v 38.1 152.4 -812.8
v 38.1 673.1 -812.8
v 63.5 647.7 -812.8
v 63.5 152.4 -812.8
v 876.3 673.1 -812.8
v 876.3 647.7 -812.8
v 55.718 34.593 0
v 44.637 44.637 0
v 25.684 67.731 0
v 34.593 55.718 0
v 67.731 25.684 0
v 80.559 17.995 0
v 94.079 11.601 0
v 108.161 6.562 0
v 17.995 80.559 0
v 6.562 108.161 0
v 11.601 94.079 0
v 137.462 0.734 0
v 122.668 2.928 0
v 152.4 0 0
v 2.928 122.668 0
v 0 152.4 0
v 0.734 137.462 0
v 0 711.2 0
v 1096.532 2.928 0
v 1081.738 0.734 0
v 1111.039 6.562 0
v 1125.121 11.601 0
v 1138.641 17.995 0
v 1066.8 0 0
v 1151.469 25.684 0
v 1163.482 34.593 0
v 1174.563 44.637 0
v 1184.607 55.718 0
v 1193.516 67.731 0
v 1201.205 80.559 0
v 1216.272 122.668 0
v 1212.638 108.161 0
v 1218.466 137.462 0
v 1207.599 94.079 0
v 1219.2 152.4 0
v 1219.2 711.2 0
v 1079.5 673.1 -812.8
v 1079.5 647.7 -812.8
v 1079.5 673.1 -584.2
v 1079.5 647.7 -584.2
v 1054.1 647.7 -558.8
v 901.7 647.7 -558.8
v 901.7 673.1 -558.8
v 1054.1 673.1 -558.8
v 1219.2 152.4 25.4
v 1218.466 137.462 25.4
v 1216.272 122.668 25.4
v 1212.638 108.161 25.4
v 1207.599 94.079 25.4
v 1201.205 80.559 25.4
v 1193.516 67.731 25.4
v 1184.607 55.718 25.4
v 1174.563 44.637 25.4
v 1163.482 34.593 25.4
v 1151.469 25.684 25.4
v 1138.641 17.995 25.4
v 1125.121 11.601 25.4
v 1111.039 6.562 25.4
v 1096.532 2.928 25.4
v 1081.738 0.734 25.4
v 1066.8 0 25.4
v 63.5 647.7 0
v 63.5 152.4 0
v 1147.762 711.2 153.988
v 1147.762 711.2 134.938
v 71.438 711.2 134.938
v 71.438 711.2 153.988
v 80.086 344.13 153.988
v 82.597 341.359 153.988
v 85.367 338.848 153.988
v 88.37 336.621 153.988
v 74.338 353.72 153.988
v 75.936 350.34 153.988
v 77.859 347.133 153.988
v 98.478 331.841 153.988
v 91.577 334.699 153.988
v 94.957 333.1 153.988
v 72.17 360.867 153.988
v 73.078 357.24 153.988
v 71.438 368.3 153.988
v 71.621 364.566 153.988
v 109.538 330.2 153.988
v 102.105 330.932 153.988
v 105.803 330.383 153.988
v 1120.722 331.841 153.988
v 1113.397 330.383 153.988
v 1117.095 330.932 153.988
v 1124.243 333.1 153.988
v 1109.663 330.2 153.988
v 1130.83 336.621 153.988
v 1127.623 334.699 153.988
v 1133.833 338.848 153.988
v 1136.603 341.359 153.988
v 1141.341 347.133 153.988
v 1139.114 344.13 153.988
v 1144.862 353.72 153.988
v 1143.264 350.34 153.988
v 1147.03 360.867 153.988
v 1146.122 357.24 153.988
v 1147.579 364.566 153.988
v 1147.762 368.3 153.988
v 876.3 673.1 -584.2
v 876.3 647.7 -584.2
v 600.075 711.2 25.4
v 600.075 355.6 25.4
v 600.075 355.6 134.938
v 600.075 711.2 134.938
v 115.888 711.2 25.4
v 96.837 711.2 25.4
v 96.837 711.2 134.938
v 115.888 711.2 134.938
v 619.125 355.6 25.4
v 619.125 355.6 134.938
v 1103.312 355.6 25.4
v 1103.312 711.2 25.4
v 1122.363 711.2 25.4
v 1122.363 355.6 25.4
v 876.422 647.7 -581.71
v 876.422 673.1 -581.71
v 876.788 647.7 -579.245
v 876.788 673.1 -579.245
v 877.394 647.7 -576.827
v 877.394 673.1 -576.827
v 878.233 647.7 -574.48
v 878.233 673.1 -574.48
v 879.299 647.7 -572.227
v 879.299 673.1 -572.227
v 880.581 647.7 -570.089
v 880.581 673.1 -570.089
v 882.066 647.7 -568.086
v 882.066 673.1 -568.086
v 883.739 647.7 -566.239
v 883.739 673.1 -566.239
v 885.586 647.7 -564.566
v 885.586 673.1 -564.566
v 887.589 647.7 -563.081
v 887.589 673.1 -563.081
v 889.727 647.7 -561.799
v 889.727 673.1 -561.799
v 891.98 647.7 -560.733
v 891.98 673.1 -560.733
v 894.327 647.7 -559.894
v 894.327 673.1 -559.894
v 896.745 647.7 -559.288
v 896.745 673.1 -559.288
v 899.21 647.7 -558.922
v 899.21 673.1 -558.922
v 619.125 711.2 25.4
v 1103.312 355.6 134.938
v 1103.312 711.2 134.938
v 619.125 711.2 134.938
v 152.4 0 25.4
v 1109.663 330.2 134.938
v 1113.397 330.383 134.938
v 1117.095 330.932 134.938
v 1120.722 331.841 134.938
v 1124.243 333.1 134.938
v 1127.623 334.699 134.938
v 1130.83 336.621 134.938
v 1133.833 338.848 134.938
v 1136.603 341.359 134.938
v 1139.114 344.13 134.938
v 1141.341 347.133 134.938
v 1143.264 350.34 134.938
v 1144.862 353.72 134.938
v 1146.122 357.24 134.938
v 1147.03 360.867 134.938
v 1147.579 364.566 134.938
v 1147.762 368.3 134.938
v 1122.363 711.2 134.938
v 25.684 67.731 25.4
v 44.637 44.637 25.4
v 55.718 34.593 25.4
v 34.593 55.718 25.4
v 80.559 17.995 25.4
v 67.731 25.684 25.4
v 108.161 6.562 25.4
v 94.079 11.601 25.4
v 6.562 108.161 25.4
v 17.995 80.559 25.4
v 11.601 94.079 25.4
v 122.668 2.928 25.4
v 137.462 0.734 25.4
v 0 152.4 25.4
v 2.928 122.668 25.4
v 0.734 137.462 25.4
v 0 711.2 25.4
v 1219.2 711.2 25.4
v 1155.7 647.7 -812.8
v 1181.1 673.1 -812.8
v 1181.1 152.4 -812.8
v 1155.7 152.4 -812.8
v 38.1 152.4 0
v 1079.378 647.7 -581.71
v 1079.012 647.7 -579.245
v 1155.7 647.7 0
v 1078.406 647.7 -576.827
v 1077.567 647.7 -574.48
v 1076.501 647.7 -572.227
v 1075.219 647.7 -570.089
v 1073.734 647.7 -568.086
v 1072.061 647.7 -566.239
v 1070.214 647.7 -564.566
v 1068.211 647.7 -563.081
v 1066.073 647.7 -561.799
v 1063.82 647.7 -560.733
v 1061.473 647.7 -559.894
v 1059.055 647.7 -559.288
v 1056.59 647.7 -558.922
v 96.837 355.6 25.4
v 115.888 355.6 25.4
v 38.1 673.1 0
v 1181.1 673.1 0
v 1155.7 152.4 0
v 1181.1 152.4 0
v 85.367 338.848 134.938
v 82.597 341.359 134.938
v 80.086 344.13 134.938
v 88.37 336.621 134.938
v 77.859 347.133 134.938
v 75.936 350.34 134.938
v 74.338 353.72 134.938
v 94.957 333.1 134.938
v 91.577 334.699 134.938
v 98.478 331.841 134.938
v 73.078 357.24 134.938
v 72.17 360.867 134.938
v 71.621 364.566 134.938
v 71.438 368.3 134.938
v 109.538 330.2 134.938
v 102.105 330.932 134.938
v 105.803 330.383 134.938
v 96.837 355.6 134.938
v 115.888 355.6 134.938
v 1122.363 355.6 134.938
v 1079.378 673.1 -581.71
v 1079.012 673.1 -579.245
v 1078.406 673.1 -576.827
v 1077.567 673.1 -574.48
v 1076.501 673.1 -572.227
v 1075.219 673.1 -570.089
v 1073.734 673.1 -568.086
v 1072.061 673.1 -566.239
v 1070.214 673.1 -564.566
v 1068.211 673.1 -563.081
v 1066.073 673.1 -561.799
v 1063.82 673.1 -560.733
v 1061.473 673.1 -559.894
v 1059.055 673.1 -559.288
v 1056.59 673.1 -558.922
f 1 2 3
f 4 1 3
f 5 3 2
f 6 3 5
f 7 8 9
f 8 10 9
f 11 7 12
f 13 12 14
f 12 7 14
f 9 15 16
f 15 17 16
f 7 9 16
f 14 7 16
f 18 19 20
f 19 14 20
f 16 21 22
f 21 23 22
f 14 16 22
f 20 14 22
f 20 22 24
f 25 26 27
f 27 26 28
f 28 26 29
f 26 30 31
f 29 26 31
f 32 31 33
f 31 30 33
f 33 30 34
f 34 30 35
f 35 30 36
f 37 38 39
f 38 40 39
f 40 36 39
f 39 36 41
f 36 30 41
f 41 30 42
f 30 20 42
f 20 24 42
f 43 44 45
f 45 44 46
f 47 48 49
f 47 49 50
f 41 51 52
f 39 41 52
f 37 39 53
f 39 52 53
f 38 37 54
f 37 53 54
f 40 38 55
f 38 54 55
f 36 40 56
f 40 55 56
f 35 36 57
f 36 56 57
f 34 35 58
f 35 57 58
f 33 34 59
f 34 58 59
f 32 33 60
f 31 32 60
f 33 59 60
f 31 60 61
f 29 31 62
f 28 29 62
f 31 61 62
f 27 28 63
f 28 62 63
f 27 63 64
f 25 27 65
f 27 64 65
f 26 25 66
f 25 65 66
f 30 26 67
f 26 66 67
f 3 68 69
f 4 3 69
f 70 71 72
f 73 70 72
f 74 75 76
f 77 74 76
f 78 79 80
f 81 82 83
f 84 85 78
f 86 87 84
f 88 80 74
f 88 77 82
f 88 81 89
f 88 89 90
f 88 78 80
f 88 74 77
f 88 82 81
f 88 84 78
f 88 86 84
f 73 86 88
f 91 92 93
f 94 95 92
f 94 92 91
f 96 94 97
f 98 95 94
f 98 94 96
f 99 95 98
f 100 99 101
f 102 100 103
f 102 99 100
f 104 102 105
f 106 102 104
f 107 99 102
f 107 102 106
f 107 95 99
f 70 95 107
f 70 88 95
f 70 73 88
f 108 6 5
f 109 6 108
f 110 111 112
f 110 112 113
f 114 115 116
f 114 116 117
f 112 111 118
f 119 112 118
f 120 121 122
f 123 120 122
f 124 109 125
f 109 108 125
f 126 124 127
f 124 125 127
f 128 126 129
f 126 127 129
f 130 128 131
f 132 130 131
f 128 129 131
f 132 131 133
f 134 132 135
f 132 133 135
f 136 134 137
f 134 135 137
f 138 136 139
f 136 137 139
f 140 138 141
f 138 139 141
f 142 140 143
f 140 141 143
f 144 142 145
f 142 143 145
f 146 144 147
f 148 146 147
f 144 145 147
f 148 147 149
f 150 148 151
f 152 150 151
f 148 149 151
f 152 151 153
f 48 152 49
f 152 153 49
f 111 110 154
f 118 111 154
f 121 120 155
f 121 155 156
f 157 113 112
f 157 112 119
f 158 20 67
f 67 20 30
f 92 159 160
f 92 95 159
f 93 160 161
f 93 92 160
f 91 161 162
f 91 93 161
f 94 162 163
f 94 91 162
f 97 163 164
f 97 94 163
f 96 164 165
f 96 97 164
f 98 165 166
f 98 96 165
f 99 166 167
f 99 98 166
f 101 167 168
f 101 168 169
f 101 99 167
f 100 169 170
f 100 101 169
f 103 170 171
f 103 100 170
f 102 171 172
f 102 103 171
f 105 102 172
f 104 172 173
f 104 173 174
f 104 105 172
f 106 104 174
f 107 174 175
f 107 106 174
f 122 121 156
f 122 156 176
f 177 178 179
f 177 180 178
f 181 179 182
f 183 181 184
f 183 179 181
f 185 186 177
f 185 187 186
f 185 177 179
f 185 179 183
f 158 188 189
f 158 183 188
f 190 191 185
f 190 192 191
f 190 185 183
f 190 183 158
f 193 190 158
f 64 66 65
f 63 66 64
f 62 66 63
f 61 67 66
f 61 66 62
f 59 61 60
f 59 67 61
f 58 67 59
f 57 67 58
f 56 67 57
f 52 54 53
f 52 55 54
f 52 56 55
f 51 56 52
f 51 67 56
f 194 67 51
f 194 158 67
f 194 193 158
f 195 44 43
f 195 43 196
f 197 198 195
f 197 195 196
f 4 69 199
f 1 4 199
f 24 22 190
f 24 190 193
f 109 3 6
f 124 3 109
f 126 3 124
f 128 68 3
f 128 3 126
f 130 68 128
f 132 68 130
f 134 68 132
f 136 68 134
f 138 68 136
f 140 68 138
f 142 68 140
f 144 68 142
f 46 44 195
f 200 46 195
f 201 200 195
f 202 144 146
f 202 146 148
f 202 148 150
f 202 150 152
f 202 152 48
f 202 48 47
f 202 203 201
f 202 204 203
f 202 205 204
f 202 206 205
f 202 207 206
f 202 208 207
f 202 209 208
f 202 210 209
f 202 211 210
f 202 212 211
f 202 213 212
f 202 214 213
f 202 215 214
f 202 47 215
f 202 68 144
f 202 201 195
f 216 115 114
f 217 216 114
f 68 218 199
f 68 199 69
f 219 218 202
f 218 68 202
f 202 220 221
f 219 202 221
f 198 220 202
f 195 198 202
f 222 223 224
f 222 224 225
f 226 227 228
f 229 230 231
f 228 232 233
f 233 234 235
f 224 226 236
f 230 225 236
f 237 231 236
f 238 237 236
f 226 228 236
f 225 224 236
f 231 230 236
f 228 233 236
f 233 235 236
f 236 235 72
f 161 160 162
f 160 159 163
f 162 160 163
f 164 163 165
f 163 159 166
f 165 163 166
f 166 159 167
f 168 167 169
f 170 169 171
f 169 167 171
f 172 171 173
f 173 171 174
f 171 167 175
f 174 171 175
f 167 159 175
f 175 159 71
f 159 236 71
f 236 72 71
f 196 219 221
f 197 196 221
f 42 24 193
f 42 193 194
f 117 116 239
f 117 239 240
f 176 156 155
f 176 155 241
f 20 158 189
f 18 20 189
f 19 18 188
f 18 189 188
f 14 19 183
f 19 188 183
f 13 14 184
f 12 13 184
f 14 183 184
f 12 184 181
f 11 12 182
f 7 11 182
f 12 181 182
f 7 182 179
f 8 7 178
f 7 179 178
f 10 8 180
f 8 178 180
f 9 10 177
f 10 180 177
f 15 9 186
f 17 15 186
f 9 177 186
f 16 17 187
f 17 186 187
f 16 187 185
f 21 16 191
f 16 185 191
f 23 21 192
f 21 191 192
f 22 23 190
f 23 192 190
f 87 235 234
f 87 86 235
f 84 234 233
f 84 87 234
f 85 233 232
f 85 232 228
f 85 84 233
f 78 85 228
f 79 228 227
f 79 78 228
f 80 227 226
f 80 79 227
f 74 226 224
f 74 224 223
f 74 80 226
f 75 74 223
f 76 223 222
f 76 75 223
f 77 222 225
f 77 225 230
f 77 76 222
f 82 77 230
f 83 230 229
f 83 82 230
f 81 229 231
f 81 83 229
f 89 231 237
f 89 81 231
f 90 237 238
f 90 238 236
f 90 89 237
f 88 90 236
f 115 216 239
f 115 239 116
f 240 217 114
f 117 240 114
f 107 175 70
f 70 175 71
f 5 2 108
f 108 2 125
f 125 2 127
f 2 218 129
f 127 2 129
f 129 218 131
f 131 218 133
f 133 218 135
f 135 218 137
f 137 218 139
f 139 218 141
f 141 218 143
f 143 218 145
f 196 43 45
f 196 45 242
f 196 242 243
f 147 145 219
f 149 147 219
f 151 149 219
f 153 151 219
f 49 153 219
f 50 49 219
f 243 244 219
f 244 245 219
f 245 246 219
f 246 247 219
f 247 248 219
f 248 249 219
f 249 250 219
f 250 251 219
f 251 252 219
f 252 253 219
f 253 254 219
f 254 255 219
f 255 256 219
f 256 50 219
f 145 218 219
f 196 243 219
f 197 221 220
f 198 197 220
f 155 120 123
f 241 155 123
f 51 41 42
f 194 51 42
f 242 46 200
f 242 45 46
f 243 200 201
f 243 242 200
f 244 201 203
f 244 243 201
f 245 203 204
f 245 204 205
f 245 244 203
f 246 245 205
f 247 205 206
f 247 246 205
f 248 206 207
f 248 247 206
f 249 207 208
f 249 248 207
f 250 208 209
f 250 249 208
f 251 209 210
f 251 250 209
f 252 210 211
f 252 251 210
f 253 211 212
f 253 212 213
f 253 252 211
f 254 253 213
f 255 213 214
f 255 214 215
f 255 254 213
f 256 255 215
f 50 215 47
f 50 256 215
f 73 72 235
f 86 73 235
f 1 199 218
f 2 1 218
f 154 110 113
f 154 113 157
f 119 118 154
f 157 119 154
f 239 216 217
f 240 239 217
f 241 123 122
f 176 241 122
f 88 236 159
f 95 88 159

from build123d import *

# Parameters (mm, degrees)
F0_W      = 1219.2
F0_H      = 711.2
F1_DEPTH  = 25.4
F3_DEPTH  = 25.4
F4_W      = 19.05
F4_H      = 355.6
F5_DEPTH  = 109.5375
F6_W      = 1092.2
F6_H      = 25.4
F7_DEPTH  = 812.8
F8_W      = 19.05
F8_H      = 355.6
F9_DEPTH  = 19.05
F10_R     = 38.1
F11_W     = 203.2
F11_H     = 254
F12_DEPTH = 25.4
F13_R     = 25.4


# Not quite as in the source:
# - a feature names something its author has since deleted; it is built from what else it names


with BuildPart() as f1:
    # F0 (on Top) → F1 (new body)
    with BuildSketch(Plane.XY):
        with Locations((609.6, 355.6)):
            Rectangle(F0_W, F0_H)
    extrude(amount=F1_DEPTH)

    # F2 (on face) → F3 (cut)
    with BuildSketch(Plane.XY.offset(25.4)):
        with BuildLine():
            ThreePointArc((152.4, 0), (44.6369265472, 44.6369265472), (0, 152.4))
            Line((0, 152.4), (0, 0))
            Line((0, 0), (152.4, 0))
        make_face()
        with BuildLine():
            ThreePointArc((1219.2, 152.4), (1174.5630734528, 44.6369265472), (1066.8, 0))
            Line((1066.8, 0), (1219.2, 0))
            Line((1219.2, 0), (1219.2, 152.4))
        make_face()
    extrude(amount=-F3_DEPTH, mode=Mode.SUBTRACT)


with BuildPart() as f5:
    # F4 (on face) → F5 (new body)
    with BuildSketch(Plane.XY.offset(25.4)):
        with Locations((106.3625, 533.4)):
            Rectangle(F4_W, F4_H)
    extrude(amount=F5_DEPTH)


with BuildPart() as f5b:
    # F4 (on face) → F5, piece 2 (new body)
    with BuildSketch(Plane.XY.offset(25.4)):
        with Locations((609.6, 533.4)):
            Rectangle(F4_W, F4_H)
    extrude(amount=F5_DEPTH)


with BuildPart() as f5c:
    # F4 (on face) → F5, piece 3 (new body)
    with BuildSketch(Plane.XY.offset(25.4)):
        with Locations((1112.8375, 533.4)):
            Rectangle(F4_W, F4_H)
    extrude(amount=F5_DEPTH)


with BuildPart() as f7:
    # F6 (on face) → F7 (new body)
    with BuildSketch(Plane(origin=(0, 0, 0), x_dir=(1, 0, 0), z_dir=(0, 0, -1))):
        Polygon((63.5, -152.4), (38.1, -152.4), (38.1, -673.1), (63.5, -673.1), (63.5, -647.7), align=None)
        with Locations((609.6, -660.4)):
            Rectangle(F6_W, F6_H)
        Polygon((1155.7, -152.4), (1155.7, -647.7), (1155.7, -673.1), (1181.1, -673.1), (1181.1, -152.4), align=None)
    extrude(amount=F7_DEPTH)

    # F11 (on face) → F12 (cut)
    with BuildSketch(Plane.XZ.offset(-647.7)):
        with Locations((977.9, -685.8)):
            Rectangle(F11_W, F11_H)
    extrude(amount=-F12_DEPTH, mode=Mode.SUBTRACT)

    # F13
    f13_edges = [f7.edges().sort_by_distance(p)[0] for p in [
        (1079.5, 660.4, -558.8),
        (876.3, 660.4, -558.8),
    ]]
    fillet(f13_edges, radius=F13_R)


with BuildPart() as f9:
    # F8 (on face) → F9 (new body)
    with BuildSketch(Plane.XY.offset(134.9375)):
        Polygon((96.8375, 711.2), (71.4375, 711.2), (71.4375, 330.2), (1147.7625, 330.2), (1147.7625, 711.2), (115.8875, 711.2), (115.8875, 355.6), (96.8375, 355.6), align=None)
        with Locations((106.3625, 533.4)):
            Rectangle(F8_W, F8_H)
    extrude(amount=F9_DEPTH)

    # F10
    f10_edges = [f9.edges().sort_by_distance(p)[0] for p in [
        (71.4375, 330.2, 144.4625),
        (1147.7625, 330.2, 144.4625),
    ]]
    fillet(f10_edges, radius=F10_R)


solid = Compound([f1.part, f5.part, f5b.part, f5c.part, f7.part, f9.part])
